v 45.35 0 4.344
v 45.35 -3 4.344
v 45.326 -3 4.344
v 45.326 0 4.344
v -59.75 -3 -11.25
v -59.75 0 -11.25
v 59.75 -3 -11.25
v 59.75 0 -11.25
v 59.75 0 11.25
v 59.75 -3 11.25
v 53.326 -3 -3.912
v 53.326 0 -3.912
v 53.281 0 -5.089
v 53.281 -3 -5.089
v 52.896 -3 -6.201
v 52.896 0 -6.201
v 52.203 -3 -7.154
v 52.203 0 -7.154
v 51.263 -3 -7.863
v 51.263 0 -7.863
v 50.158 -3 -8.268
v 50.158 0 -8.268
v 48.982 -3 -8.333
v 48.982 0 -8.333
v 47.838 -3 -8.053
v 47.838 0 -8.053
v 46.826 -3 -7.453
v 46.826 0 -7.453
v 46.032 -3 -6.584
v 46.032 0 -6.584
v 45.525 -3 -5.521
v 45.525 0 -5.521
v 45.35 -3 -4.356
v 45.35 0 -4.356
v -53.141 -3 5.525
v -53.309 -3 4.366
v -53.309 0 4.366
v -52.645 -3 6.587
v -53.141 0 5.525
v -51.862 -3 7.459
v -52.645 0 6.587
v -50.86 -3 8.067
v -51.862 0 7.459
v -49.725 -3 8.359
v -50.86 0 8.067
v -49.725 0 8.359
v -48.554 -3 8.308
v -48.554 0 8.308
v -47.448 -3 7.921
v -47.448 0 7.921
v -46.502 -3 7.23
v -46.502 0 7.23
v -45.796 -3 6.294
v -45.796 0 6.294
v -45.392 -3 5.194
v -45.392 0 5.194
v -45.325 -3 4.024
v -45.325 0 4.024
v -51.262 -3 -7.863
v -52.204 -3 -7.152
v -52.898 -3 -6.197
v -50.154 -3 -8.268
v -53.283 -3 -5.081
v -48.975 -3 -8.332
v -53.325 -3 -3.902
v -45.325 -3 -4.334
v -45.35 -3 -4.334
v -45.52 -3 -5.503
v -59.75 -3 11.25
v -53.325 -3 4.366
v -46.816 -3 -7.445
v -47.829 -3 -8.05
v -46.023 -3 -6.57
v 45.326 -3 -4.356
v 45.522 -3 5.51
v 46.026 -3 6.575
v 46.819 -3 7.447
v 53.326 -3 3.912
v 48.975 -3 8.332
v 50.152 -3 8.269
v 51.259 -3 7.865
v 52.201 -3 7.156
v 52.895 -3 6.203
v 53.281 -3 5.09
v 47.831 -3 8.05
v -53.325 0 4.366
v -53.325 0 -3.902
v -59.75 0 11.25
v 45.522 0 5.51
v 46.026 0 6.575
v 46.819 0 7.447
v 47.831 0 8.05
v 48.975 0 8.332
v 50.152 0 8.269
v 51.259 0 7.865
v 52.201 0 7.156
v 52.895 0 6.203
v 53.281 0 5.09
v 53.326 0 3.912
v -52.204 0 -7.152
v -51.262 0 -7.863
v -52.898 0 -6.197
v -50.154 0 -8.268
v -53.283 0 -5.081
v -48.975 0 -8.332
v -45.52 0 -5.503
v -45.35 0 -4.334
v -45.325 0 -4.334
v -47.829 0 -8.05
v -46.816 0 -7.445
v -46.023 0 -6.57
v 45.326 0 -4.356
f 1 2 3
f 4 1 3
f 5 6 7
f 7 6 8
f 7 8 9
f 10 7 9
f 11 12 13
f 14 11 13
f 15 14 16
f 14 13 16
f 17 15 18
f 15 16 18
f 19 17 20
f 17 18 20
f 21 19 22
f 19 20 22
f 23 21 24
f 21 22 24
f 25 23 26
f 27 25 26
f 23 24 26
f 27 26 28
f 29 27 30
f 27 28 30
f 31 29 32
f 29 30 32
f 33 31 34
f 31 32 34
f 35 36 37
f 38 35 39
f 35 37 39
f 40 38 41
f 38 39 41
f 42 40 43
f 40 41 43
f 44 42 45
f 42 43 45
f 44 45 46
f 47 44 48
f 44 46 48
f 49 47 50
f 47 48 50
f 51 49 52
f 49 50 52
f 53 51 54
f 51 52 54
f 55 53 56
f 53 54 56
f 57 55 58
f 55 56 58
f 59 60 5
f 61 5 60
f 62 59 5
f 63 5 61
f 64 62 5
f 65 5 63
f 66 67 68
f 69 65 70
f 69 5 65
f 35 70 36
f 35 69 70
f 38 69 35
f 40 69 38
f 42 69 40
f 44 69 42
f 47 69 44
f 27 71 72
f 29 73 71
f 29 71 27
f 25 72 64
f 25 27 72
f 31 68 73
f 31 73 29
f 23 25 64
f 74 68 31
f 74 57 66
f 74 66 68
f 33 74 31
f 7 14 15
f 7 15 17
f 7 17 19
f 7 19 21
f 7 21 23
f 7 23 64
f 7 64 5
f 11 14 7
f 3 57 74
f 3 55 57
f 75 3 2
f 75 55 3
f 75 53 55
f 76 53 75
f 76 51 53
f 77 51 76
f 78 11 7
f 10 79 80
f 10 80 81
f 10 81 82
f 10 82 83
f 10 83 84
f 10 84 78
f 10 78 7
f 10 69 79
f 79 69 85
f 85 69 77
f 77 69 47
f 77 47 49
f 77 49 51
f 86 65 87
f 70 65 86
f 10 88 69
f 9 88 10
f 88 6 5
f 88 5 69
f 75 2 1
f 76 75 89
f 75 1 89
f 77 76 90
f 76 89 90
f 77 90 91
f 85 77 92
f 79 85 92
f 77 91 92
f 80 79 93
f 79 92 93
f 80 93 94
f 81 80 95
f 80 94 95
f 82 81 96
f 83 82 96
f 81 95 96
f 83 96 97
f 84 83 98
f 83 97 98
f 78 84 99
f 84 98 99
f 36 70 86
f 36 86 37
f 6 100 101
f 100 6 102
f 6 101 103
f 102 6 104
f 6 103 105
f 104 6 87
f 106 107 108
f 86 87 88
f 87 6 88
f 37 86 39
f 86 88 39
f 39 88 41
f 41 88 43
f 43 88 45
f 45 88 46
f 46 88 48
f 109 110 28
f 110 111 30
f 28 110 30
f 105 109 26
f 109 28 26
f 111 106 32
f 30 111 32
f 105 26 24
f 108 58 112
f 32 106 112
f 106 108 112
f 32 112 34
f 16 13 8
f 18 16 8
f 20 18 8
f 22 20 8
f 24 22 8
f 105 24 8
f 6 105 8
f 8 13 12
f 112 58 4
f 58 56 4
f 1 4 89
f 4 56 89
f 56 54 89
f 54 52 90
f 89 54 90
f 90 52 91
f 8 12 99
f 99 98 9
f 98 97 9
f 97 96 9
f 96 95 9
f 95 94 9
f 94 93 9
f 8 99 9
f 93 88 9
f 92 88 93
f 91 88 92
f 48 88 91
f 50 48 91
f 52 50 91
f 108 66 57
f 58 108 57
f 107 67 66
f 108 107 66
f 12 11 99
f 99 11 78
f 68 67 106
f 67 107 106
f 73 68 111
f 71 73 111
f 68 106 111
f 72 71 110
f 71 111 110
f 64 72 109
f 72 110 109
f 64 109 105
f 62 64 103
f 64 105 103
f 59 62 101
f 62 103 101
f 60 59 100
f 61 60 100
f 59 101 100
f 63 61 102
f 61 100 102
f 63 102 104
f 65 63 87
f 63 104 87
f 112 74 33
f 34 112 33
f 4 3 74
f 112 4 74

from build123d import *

# Parameters (mm, degrees)
F0_W      = 119.5
F0_H      = 22.5
F1_DEPTH  = 3
F3_D      = 8
F4_D      = 8
F5_W      = 8
F5_H      = 8.7
F6_DEPTH  = 3
F8_D      = 8
F9_D      = 8
F12_DEPTH = 3


with BuildPart() as f1:
    # F0 (on Front) → F1 (new body)
    with BuildSketch(Plane.XZ):
        Rectangle(F0_W, F0_H)
    extrude(amount=F1_DEPTH)

    # F3 (through all)
    with Locations(Plane.XZ.offset(3)):
        with Locations((-49.3088774383, 4.3802403379)):
            Hole(F3_D / 2)

    # F4 (through all)
    with Locations(Plane.XZ.offset(3)):
        with Locations((-49.35, -4.35)):
            Hole(F4_D / 2)

    # F5 (on face) → F6 (cut)
    with BuildSketch(Plane.XZ.offset(3)):
        with Locations((-49.3247925341, 0.0155190326)):
            Rectangle(F5_W, F5_H)
    extrude(amount=-F6_DEPTH, mode=Mode.SUBTRACT)

    # F8 (through all)
    with Locations(Plane.XZ.offset(3)):
        with Locations((49.35, 4.35)):
            Hole(F8_D / 2)

    # F9 (through all)
    with Locations(Plane.XZ.offset(3)):
        with Locations((49.35, -4.35)):
            Hole(F9_D / 2)

    # F11 (on face) → F12 (cut)
    with BuildSketch(Plane.XZ.offset(3)):
        Polygon((53.3259802461, -4.3563189382), (53.3259802461, 4.3436810618), (45.3259802461, 4.3436810618), (45.3259802461, -4.3563189382), (49.35, -4.3563189382), align=None)
    extrude(amount=-F12_DEPTH, mode=Mode.SUBTRACT)


solid = f1.part
